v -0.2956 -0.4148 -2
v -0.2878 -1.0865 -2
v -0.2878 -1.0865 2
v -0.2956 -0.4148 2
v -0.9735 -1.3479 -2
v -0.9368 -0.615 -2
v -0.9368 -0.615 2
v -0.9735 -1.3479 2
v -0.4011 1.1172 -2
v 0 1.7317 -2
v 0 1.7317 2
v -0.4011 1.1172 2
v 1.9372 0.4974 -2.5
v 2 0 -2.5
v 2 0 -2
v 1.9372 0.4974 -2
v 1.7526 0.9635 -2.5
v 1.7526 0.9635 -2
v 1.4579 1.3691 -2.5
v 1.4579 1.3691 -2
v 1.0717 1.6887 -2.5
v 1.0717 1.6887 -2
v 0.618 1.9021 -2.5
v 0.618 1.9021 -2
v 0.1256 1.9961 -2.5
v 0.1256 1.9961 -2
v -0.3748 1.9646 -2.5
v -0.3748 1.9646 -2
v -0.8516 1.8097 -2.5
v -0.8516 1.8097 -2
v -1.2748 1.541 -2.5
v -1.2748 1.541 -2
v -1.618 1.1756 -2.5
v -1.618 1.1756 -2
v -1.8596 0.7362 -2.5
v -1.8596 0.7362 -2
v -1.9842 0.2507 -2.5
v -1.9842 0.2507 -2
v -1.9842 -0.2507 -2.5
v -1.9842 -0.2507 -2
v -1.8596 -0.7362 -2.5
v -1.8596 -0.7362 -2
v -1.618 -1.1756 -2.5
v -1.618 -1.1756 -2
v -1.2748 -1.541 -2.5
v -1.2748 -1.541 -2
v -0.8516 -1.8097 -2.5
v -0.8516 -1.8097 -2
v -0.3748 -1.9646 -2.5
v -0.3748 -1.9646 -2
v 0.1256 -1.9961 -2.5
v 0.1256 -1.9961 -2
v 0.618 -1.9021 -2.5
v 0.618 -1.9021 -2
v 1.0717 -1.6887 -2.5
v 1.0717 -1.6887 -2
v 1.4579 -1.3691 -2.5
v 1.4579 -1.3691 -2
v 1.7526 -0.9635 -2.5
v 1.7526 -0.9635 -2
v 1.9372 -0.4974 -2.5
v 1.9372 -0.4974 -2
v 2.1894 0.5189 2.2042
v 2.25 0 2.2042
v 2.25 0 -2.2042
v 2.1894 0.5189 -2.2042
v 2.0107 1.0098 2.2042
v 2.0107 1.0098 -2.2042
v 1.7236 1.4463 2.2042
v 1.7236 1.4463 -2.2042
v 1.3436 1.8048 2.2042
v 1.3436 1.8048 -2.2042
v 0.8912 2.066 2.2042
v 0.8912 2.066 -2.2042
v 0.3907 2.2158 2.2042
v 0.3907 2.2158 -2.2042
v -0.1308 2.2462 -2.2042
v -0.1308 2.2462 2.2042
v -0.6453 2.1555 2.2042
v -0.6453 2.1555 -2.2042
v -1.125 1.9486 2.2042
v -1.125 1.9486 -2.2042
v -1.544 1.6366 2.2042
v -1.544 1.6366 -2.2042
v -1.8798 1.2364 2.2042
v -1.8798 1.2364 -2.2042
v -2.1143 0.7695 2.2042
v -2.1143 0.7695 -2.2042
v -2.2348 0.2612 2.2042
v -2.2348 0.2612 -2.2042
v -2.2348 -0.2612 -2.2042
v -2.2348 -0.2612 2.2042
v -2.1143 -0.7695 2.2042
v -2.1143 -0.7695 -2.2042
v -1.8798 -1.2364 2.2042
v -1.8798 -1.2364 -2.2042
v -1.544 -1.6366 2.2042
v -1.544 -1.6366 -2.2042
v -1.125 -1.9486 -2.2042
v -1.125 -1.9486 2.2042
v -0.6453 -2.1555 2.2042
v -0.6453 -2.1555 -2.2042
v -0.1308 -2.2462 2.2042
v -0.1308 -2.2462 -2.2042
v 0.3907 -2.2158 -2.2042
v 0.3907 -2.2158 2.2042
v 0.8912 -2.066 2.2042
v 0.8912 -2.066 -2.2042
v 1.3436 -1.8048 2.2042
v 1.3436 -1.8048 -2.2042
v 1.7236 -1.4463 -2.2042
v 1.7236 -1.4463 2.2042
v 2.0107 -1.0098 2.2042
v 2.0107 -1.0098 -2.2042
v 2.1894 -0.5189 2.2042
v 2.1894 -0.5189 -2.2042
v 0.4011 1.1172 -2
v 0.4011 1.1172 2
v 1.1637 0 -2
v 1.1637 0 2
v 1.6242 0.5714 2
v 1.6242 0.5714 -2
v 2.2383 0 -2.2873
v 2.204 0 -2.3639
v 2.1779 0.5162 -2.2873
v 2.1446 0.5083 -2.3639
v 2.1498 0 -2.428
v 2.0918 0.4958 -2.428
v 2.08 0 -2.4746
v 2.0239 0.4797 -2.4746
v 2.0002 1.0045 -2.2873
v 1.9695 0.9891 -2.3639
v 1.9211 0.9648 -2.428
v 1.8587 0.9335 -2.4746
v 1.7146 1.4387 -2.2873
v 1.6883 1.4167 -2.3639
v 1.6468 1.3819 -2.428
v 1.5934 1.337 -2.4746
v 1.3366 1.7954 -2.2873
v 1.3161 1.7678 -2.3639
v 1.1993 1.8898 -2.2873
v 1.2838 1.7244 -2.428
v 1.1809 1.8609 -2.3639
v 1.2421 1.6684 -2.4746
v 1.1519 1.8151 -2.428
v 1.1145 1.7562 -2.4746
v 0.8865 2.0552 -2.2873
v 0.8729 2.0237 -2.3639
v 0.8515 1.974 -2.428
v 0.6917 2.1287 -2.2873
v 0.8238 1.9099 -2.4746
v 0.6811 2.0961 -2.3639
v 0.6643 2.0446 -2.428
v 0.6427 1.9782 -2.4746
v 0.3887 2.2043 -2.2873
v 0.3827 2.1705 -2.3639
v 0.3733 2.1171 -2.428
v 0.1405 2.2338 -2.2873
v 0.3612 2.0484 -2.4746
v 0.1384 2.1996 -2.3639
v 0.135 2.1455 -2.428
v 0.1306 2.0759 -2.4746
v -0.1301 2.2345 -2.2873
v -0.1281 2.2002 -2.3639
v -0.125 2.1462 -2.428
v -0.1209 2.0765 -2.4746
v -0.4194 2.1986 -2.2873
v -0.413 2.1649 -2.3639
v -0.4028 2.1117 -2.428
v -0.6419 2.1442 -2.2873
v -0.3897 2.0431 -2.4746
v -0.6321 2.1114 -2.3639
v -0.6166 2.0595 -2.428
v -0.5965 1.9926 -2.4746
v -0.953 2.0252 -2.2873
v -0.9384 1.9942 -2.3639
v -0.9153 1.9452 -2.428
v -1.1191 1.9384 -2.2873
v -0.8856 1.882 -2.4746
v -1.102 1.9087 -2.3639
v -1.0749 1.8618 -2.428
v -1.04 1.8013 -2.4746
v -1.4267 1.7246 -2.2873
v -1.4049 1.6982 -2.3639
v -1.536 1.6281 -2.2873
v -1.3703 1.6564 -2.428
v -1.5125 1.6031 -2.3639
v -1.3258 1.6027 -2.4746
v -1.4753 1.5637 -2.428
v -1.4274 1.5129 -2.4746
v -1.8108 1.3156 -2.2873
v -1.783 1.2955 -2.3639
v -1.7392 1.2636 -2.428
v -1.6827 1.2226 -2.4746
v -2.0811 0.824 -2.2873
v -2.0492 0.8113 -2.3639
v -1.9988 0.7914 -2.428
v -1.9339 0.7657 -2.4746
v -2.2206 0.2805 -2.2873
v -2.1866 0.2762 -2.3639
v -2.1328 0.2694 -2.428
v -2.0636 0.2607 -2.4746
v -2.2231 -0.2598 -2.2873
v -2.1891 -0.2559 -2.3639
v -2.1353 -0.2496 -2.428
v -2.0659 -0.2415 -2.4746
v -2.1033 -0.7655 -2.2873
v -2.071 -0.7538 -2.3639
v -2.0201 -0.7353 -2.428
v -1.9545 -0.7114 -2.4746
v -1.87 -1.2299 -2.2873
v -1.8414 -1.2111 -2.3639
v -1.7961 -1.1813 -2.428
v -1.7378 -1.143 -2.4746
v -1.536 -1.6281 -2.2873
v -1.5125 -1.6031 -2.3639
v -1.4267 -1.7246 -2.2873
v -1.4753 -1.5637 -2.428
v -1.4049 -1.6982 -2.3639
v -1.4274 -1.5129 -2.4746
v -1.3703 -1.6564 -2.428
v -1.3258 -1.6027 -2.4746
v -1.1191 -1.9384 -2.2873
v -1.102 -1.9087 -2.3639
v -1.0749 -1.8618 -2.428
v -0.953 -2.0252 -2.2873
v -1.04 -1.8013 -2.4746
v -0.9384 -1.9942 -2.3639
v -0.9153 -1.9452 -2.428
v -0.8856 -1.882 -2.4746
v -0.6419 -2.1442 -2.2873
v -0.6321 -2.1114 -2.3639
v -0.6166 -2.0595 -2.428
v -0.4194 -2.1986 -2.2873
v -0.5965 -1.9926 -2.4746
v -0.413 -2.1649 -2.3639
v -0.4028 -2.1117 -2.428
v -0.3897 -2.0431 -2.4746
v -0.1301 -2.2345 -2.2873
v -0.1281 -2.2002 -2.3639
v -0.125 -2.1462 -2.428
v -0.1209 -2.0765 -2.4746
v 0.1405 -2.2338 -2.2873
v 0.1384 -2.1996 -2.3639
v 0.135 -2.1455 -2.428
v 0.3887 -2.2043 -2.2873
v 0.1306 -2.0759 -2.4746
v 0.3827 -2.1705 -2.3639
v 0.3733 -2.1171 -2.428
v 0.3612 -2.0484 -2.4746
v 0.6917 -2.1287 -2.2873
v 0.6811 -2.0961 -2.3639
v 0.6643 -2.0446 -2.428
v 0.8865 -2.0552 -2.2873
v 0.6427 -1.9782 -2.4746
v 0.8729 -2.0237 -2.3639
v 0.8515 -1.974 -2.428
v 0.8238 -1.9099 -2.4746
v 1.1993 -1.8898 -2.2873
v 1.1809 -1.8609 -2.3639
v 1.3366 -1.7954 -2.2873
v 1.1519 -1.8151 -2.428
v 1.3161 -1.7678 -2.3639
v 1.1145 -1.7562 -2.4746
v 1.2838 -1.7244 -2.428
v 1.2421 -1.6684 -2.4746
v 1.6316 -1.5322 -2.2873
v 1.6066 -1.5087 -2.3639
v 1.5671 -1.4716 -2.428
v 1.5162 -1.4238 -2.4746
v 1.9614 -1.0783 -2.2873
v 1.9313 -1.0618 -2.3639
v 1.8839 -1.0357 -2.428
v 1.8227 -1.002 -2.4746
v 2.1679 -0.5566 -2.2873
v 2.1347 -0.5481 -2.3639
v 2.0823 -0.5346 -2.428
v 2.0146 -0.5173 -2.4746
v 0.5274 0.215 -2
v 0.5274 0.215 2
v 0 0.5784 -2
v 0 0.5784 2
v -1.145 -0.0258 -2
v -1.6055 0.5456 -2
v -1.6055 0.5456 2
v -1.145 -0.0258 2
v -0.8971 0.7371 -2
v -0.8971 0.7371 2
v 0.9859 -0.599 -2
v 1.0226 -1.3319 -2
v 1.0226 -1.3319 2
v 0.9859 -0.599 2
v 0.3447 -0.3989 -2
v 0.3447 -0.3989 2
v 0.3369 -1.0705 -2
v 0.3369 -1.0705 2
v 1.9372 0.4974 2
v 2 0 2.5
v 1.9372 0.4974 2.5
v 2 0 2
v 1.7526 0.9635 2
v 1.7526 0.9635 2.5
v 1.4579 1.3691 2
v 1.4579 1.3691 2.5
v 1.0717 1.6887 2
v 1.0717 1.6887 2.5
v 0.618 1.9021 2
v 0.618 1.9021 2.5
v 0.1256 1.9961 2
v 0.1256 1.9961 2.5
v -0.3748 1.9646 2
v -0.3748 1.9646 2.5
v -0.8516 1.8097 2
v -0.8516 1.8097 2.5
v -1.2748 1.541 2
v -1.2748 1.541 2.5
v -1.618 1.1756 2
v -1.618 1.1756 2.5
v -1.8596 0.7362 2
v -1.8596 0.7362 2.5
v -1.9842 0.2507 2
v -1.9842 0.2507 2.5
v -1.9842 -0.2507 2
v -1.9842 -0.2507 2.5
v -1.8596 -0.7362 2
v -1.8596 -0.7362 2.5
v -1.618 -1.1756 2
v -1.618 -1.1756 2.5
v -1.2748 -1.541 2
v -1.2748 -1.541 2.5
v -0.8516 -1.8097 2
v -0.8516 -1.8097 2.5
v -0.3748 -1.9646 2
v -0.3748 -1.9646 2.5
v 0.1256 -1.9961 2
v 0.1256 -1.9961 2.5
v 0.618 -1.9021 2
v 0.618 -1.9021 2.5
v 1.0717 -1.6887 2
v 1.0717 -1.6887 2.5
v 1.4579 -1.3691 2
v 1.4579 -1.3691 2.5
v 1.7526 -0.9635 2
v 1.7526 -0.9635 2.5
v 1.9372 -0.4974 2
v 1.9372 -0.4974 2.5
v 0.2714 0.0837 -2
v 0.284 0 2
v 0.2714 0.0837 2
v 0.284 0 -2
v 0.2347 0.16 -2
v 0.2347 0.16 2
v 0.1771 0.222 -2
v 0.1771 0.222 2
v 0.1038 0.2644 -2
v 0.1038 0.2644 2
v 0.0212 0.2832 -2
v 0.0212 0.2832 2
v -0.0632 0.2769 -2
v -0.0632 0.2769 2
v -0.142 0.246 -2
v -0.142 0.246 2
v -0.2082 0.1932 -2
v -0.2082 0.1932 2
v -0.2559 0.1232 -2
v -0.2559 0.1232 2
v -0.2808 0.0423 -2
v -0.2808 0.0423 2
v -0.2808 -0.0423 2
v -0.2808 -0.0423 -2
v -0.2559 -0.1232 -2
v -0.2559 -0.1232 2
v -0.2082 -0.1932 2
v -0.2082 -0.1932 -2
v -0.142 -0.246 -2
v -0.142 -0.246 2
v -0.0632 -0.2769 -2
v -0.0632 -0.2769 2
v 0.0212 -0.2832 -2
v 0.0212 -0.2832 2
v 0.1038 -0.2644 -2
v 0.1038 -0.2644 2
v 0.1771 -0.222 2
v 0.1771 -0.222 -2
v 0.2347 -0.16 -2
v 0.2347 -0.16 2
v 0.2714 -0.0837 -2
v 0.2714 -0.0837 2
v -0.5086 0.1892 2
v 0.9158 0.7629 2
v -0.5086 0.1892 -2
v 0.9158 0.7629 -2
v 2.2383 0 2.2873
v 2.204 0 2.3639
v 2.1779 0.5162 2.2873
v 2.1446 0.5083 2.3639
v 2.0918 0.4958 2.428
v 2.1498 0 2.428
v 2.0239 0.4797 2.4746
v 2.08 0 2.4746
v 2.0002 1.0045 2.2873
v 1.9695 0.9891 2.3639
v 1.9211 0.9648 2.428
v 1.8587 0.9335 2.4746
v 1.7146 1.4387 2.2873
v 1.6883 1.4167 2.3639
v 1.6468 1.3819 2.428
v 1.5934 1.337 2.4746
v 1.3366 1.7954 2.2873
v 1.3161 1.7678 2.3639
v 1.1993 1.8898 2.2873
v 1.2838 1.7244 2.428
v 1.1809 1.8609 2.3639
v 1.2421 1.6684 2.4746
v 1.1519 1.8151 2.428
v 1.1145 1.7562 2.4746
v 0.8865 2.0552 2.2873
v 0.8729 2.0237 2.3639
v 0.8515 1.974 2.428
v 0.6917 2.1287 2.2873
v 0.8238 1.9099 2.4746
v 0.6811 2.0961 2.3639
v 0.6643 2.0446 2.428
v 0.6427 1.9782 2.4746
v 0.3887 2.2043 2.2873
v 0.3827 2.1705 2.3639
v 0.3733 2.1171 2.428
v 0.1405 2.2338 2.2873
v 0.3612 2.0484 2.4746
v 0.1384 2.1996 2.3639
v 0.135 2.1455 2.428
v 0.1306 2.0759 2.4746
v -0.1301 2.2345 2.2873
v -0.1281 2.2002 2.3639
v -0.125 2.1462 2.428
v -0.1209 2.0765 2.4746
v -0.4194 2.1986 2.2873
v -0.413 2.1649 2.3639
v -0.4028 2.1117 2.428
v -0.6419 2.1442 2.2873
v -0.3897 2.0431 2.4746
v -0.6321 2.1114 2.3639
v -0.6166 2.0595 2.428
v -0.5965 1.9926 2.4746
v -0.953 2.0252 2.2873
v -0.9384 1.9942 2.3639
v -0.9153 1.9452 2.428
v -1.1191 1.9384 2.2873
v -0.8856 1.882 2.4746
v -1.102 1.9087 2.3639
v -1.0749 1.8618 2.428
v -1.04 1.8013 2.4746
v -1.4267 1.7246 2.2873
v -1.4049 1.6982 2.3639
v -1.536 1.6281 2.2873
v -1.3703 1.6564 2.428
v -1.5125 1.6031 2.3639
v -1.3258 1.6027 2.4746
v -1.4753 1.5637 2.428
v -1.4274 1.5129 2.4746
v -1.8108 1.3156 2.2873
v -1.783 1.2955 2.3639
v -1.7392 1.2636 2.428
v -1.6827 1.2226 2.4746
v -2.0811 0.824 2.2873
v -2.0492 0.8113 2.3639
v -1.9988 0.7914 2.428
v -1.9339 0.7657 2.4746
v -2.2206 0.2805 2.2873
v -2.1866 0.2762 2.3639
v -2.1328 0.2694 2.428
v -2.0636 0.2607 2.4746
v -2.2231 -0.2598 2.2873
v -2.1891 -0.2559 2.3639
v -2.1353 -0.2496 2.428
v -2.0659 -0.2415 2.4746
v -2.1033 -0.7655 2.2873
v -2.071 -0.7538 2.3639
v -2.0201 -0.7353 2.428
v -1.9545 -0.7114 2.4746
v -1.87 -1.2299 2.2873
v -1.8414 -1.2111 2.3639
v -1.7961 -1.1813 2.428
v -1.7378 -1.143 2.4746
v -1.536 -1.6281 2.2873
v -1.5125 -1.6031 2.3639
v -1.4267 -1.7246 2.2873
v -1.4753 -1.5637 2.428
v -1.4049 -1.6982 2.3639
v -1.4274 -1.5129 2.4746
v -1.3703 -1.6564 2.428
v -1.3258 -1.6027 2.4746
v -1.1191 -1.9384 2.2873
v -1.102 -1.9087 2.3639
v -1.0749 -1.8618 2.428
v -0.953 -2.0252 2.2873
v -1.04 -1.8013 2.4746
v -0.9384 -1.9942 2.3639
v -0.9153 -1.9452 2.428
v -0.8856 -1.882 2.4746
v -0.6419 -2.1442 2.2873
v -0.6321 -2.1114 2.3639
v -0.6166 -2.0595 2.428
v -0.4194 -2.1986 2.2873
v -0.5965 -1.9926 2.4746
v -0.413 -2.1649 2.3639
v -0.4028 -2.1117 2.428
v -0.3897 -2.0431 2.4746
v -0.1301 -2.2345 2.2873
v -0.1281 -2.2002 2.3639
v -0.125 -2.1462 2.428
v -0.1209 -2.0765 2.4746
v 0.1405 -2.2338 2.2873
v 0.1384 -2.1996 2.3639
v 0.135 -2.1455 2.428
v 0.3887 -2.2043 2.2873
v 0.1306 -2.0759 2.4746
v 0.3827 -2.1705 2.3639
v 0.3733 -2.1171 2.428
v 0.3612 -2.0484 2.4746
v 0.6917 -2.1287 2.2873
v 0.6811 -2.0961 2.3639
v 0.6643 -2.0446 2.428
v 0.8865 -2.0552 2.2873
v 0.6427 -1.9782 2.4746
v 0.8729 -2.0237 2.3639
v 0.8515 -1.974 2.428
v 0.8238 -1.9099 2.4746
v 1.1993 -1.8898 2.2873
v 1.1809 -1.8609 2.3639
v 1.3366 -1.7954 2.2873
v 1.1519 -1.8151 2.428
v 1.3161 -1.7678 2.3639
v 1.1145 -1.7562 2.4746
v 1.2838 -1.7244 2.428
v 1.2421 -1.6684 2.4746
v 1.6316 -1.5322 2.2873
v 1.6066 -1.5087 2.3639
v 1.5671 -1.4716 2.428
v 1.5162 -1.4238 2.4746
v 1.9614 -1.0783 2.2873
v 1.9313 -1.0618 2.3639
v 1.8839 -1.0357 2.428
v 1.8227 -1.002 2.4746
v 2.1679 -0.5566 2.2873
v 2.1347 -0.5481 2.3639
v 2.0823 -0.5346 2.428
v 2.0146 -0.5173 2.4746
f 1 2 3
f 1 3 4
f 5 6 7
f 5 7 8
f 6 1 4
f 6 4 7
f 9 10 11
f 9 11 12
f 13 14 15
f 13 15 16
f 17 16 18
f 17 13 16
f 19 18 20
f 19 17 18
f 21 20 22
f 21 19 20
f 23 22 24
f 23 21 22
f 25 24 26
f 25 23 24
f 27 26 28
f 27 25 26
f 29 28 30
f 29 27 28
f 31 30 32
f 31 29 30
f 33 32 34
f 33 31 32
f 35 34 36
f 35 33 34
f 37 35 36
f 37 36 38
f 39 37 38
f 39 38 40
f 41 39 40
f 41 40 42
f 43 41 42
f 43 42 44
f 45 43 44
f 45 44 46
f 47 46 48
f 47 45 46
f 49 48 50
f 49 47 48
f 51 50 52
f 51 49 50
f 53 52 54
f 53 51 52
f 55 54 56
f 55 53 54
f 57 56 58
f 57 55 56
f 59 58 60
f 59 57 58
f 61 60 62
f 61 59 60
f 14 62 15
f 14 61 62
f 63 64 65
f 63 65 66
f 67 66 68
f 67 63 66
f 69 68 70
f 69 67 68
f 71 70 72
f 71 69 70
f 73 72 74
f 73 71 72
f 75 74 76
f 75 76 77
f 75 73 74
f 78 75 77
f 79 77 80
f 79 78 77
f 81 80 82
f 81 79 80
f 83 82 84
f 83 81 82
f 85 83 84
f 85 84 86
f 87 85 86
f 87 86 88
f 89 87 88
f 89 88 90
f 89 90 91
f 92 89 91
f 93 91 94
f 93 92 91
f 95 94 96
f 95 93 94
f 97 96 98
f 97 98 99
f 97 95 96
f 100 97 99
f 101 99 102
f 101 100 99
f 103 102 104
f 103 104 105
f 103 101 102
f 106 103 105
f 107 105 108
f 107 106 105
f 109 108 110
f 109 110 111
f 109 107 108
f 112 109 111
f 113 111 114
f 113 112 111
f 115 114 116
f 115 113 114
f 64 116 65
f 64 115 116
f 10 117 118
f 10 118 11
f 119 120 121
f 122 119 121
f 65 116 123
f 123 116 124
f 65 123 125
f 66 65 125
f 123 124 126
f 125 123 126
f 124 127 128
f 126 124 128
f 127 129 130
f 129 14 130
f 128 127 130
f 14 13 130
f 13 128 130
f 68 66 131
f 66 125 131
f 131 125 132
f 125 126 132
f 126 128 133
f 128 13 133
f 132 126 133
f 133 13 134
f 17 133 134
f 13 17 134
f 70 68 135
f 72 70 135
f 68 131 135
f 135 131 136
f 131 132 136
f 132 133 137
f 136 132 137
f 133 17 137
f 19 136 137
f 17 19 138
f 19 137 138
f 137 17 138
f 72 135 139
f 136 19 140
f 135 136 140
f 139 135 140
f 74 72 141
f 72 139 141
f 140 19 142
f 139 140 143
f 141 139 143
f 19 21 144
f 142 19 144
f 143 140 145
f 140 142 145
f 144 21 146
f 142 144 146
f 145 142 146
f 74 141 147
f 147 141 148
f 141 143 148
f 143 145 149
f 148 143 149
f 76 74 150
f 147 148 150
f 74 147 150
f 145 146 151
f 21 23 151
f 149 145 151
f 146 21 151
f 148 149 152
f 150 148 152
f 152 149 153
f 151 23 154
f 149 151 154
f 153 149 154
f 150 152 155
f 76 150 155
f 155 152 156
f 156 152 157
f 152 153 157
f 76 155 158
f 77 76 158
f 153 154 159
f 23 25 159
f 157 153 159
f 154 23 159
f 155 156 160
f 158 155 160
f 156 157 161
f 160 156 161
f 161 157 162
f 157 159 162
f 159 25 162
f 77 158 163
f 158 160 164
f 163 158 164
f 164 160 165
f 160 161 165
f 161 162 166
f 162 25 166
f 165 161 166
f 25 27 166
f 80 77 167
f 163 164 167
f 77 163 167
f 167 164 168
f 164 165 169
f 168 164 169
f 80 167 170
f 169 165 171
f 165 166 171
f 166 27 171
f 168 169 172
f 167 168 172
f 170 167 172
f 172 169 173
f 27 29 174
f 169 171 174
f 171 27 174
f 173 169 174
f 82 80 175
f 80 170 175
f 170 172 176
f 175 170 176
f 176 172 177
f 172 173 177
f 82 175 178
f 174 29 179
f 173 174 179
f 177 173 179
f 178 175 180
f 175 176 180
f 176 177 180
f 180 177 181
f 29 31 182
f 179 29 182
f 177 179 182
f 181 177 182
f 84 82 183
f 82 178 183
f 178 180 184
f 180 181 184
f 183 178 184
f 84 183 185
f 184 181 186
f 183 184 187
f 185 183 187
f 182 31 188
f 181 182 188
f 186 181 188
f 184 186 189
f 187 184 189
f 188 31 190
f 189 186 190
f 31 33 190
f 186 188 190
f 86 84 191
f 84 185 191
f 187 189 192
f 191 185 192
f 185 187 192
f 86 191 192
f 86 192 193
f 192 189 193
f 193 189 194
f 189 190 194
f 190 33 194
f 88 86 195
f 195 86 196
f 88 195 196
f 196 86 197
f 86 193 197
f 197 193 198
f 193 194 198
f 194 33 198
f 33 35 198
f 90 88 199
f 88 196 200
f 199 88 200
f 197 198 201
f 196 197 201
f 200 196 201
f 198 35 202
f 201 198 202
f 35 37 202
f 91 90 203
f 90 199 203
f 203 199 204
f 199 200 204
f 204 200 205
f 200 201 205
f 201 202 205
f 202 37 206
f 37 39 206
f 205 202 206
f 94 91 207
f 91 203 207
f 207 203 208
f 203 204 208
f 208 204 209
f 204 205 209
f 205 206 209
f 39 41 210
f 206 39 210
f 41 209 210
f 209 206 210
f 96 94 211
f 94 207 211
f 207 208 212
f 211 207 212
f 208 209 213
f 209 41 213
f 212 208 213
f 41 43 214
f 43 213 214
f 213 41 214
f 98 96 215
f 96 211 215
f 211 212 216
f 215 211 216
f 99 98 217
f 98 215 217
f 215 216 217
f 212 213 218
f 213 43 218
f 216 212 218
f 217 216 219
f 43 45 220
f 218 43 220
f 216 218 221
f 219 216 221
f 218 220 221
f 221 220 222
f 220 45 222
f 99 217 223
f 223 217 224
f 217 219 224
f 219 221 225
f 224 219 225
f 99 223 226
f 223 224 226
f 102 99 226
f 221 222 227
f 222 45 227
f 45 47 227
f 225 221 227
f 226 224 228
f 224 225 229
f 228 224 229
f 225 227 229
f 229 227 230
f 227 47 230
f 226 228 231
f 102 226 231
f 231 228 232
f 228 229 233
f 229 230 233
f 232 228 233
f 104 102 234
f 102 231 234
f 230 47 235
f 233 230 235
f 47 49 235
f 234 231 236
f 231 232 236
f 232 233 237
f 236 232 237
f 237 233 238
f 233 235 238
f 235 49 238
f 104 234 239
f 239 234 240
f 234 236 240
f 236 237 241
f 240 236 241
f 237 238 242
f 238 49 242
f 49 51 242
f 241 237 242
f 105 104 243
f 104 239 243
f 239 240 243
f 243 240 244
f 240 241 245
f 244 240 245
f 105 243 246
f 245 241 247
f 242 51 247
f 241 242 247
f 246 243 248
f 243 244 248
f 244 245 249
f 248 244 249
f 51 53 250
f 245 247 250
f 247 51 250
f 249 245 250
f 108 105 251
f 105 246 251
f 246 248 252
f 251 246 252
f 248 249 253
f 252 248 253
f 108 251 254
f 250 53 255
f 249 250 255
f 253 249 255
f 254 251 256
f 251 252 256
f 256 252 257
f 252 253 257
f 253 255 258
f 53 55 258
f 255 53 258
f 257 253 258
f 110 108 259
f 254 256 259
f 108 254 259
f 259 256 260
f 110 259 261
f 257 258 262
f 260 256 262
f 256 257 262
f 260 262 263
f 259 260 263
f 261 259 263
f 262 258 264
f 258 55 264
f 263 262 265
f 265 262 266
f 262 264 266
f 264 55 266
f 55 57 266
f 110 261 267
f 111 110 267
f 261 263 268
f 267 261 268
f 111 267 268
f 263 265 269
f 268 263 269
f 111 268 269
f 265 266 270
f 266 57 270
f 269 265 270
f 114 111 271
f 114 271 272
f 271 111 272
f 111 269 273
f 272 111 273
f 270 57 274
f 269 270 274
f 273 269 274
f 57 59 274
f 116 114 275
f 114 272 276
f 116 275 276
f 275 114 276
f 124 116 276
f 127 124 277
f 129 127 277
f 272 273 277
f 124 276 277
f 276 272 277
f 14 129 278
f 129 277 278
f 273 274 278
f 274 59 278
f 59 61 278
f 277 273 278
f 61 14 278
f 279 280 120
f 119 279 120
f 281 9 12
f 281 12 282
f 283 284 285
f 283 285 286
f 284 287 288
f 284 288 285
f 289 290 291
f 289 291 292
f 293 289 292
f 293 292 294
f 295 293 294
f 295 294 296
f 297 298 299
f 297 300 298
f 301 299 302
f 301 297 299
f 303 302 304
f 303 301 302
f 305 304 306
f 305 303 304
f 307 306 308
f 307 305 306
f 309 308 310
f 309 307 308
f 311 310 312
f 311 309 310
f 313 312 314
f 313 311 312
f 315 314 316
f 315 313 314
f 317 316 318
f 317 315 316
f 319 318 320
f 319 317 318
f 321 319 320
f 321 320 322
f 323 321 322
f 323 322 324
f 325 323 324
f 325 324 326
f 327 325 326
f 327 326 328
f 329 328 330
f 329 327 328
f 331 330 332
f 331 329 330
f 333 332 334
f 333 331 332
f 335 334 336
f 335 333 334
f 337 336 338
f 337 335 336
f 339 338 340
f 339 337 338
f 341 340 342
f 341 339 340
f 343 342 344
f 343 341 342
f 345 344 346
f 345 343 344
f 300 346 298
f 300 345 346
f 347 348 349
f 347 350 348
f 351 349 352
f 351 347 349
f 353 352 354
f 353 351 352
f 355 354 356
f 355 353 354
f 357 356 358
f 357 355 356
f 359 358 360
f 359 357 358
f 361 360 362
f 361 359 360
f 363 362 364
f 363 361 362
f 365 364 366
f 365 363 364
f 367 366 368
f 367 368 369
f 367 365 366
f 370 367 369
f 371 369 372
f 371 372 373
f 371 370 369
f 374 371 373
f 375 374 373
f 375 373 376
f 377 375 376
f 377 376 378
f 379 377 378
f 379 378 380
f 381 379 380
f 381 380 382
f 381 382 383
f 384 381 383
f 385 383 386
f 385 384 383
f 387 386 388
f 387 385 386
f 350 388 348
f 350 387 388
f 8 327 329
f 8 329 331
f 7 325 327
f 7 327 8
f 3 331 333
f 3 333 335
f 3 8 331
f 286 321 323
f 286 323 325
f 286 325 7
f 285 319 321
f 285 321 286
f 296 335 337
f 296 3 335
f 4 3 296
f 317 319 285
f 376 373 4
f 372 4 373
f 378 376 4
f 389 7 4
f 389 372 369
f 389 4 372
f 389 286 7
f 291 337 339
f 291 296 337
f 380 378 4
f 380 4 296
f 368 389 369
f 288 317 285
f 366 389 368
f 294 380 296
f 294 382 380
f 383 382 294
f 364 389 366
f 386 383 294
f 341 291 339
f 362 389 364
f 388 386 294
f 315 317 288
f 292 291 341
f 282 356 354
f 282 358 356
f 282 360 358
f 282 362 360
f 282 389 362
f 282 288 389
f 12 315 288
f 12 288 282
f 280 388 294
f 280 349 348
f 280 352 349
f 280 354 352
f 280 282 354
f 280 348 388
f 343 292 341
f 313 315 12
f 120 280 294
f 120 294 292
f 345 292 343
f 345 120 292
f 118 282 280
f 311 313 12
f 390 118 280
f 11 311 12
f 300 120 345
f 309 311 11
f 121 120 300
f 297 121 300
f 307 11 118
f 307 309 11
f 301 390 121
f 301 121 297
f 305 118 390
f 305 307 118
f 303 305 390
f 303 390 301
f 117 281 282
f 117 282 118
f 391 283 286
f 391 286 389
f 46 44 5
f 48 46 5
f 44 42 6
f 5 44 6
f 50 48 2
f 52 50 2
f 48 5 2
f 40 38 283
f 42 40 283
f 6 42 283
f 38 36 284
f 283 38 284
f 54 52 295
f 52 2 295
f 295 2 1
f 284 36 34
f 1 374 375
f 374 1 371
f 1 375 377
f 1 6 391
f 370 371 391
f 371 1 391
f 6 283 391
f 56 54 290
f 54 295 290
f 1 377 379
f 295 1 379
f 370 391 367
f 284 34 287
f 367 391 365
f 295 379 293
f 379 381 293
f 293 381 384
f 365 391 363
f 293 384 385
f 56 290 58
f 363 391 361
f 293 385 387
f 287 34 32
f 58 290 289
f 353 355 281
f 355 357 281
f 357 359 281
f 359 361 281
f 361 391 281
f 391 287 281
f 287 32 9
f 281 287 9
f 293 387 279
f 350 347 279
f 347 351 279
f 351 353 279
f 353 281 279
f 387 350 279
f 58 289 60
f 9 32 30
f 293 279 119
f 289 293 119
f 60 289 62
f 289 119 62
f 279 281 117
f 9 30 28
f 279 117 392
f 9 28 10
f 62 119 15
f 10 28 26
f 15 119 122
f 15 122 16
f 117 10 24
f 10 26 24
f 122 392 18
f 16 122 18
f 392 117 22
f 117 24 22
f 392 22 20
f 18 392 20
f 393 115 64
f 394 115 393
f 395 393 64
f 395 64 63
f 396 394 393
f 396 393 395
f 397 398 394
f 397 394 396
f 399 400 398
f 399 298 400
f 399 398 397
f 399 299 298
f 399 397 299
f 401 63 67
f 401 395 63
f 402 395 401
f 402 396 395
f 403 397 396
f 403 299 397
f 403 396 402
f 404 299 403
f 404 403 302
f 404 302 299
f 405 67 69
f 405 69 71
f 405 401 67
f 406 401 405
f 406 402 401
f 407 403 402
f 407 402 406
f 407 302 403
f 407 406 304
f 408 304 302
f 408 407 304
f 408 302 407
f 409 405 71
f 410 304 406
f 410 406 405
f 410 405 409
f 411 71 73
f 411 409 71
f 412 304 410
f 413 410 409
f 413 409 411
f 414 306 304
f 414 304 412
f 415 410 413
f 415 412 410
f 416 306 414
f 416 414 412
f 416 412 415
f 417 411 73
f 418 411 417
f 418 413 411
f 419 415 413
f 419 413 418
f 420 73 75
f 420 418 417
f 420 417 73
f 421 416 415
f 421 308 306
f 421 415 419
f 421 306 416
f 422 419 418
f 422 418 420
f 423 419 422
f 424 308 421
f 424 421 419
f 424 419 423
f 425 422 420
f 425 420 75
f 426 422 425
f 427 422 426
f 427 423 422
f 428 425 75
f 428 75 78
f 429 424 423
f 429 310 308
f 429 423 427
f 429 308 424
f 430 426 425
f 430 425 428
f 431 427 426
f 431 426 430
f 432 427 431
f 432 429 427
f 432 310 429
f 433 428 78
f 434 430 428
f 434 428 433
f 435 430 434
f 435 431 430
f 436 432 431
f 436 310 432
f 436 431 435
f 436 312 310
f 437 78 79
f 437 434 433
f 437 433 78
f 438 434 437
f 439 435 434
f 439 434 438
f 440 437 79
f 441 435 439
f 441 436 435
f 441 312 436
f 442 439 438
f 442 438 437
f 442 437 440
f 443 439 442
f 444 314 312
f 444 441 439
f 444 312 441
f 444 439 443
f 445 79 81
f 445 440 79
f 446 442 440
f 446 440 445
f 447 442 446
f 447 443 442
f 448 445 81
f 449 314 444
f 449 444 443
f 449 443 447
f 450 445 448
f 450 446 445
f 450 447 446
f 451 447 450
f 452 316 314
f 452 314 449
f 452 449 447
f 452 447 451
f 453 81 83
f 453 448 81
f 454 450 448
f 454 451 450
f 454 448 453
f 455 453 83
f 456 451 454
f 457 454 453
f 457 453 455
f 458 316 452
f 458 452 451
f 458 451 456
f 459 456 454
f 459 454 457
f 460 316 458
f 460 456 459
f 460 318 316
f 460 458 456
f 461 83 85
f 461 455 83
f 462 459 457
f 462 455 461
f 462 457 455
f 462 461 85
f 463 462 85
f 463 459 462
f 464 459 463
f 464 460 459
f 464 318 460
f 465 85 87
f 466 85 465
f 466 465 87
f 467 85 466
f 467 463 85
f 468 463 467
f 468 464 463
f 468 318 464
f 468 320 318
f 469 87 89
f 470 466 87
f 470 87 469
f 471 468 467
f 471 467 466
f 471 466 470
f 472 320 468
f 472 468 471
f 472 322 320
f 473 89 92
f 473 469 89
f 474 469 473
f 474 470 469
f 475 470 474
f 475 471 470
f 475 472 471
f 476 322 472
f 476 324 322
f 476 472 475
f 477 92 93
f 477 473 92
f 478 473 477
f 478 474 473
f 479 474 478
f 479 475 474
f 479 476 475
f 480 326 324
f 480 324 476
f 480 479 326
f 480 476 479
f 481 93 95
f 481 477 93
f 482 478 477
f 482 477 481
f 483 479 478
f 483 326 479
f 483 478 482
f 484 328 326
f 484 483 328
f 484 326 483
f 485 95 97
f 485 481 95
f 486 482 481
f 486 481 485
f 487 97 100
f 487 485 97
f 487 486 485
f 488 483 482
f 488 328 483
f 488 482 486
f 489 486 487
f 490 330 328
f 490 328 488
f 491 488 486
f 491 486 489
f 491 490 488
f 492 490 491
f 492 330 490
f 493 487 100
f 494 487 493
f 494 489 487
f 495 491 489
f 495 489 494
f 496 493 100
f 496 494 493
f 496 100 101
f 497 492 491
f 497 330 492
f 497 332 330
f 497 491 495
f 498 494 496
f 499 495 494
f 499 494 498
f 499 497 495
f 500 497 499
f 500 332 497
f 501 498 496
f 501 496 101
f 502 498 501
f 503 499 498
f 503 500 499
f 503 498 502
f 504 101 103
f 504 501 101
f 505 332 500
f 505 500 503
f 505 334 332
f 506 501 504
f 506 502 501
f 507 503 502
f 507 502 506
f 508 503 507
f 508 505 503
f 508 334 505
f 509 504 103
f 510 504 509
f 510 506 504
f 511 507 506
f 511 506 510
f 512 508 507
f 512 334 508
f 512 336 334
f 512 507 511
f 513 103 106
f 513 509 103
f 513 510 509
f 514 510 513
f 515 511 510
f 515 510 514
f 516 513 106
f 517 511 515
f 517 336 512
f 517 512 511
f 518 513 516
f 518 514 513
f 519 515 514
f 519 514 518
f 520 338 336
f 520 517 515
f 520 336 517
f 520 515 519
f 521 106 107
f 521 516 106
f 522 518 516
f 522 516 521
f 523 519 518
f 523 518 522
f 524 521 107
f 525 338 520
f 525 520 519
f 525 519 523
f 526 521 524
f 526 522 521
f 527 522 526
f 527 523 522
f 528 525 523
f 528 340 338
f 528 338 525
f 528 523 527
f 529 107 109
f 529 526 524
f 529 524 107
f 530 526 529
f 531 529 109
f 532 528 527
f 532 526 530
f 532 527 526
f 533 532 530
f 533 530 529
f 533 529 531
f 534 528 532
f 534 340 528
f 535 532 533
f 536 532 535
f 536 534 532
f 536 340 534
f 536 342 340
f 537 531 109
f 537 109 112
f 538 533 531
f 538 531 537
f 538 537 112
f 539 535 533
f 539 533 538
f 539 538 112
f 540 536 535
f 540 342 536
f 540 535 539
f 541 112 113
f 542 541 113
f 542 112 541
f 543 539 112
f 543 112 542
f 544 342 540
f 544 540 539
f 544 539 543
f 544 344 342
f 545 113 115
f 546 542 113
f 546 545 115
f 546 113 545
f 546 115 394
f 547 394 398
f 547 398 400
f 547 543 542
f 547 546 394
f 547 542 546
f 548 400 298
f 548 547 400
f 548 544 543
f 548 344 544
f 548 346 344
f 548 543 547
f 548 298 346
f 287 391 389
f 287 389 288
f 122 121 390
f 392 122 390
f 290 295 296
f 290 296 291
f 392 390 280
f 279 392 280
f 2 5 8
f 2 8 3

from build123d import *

# Parameters (mm, degrees)
F0_R     = 2
F0_R_2   = 0.284
F1_DEPTH = 2
F0_R_3   = 2.25
F2_DEPTH = 2.5
F4_DEPTH = 12.5


# Not quite as in the source:
# - a fillet or chamfer that OpenCascade refuses, or shapes differently, is made with other operations: its cross-section is extruded or revolved along the edge and cut away or added


with BuildPart() as f1:
    # F0 (on Top) → F1 (new body, symmetric)
    with BuildSketch(Plane.XY):
        Circle(F0_R)
        Circle(F0_R_2, mode=Mode.SUBTRACT)
    extrude(amount=F1_DEPTH, both=True)

    # F0 (on Top) → F2 (join, symmetric)
    with BuildSketch(Plane.XY):
        Circle(F0_R_3)
        Circle(F0_R, mode=Mode.SUBTRACT)
    extrude(amount=F2_DEPTH, both=True)

    # F3 (on Top) → F4 (cut, symmetric)
    with BuildSketch(Plane.XY):
        Polygon((0.4010943762, 1.1171780688), (0, 1.7317327438), (-0.4010943762, 1.1171780688), (0, 0.5784067907), align=None)
        Polygon((-0.8970670571, 0.7371121703), (-1.605488264, 0.5455565888), (-1.1449570143, -0.0258146699), (-0.508610101, 0.1891592692), align=None)
        Polygon((-0.9367568521, -0.6149595416), (-0.9734908601, -1.3479020768), (-0.2877725187, -1.0864742598), (-0.2955828739, -0.4148417807), align=None)
        Polygon((0.3368749389, -1.0705199164), (1.0225932803, -1.3319477334), (0.9858592722, -0.5990051982), (0.344685294, -0.3988874373), align=None)
        Polygon((1.1637124699, 0), (1.6242437196, 0.5713712587), (0.9158225127, 0.7629268403), (0.5273655565, 0.2149739391), align=None)
    extrude(amount=F4_DEPTH, both=True, mode=Mode.SUBTRACT)

    # F5: fillet of radius 0.3 on 3 edges, made by hand

    # F5_s1 → F5_t2 (revolve, cut)
    with BuildSketch(Plane.XZ):
        with BuildLine():
            ThreePointArc((2.25, -2.2041960108), (2.1791287847, -2.3978451782), (2, -2.5))
            Line((2, -2.5), (2.25, -2.5))
            Line((2.25, -2.5), (2.25, -2.2041960108))
        make_face()
    revolve(axis=Axis((0, 0, -2.5), (0, 0, 1)), mode=Mode.SUBTRACT)

    # F5_s3 → F5_t4 (revolve, cut)
    with BuildSketch(Plane.XZ):
        with BuildLine():
            ThreePointArc((2.25, 2.2041960108), (2.1791287847, 2.3978451782), (2, 2.5))
            Line((2, 2.5), (2.25, 2.5))
            Line((2.25, 2.5), (2.25, 2.2041960108))
        make_face()
    revolve(axis=Axis((0, 0, 2.5), (0, 0, 1)), mode=Mode.SUBTRACT)


solid = f1.part
